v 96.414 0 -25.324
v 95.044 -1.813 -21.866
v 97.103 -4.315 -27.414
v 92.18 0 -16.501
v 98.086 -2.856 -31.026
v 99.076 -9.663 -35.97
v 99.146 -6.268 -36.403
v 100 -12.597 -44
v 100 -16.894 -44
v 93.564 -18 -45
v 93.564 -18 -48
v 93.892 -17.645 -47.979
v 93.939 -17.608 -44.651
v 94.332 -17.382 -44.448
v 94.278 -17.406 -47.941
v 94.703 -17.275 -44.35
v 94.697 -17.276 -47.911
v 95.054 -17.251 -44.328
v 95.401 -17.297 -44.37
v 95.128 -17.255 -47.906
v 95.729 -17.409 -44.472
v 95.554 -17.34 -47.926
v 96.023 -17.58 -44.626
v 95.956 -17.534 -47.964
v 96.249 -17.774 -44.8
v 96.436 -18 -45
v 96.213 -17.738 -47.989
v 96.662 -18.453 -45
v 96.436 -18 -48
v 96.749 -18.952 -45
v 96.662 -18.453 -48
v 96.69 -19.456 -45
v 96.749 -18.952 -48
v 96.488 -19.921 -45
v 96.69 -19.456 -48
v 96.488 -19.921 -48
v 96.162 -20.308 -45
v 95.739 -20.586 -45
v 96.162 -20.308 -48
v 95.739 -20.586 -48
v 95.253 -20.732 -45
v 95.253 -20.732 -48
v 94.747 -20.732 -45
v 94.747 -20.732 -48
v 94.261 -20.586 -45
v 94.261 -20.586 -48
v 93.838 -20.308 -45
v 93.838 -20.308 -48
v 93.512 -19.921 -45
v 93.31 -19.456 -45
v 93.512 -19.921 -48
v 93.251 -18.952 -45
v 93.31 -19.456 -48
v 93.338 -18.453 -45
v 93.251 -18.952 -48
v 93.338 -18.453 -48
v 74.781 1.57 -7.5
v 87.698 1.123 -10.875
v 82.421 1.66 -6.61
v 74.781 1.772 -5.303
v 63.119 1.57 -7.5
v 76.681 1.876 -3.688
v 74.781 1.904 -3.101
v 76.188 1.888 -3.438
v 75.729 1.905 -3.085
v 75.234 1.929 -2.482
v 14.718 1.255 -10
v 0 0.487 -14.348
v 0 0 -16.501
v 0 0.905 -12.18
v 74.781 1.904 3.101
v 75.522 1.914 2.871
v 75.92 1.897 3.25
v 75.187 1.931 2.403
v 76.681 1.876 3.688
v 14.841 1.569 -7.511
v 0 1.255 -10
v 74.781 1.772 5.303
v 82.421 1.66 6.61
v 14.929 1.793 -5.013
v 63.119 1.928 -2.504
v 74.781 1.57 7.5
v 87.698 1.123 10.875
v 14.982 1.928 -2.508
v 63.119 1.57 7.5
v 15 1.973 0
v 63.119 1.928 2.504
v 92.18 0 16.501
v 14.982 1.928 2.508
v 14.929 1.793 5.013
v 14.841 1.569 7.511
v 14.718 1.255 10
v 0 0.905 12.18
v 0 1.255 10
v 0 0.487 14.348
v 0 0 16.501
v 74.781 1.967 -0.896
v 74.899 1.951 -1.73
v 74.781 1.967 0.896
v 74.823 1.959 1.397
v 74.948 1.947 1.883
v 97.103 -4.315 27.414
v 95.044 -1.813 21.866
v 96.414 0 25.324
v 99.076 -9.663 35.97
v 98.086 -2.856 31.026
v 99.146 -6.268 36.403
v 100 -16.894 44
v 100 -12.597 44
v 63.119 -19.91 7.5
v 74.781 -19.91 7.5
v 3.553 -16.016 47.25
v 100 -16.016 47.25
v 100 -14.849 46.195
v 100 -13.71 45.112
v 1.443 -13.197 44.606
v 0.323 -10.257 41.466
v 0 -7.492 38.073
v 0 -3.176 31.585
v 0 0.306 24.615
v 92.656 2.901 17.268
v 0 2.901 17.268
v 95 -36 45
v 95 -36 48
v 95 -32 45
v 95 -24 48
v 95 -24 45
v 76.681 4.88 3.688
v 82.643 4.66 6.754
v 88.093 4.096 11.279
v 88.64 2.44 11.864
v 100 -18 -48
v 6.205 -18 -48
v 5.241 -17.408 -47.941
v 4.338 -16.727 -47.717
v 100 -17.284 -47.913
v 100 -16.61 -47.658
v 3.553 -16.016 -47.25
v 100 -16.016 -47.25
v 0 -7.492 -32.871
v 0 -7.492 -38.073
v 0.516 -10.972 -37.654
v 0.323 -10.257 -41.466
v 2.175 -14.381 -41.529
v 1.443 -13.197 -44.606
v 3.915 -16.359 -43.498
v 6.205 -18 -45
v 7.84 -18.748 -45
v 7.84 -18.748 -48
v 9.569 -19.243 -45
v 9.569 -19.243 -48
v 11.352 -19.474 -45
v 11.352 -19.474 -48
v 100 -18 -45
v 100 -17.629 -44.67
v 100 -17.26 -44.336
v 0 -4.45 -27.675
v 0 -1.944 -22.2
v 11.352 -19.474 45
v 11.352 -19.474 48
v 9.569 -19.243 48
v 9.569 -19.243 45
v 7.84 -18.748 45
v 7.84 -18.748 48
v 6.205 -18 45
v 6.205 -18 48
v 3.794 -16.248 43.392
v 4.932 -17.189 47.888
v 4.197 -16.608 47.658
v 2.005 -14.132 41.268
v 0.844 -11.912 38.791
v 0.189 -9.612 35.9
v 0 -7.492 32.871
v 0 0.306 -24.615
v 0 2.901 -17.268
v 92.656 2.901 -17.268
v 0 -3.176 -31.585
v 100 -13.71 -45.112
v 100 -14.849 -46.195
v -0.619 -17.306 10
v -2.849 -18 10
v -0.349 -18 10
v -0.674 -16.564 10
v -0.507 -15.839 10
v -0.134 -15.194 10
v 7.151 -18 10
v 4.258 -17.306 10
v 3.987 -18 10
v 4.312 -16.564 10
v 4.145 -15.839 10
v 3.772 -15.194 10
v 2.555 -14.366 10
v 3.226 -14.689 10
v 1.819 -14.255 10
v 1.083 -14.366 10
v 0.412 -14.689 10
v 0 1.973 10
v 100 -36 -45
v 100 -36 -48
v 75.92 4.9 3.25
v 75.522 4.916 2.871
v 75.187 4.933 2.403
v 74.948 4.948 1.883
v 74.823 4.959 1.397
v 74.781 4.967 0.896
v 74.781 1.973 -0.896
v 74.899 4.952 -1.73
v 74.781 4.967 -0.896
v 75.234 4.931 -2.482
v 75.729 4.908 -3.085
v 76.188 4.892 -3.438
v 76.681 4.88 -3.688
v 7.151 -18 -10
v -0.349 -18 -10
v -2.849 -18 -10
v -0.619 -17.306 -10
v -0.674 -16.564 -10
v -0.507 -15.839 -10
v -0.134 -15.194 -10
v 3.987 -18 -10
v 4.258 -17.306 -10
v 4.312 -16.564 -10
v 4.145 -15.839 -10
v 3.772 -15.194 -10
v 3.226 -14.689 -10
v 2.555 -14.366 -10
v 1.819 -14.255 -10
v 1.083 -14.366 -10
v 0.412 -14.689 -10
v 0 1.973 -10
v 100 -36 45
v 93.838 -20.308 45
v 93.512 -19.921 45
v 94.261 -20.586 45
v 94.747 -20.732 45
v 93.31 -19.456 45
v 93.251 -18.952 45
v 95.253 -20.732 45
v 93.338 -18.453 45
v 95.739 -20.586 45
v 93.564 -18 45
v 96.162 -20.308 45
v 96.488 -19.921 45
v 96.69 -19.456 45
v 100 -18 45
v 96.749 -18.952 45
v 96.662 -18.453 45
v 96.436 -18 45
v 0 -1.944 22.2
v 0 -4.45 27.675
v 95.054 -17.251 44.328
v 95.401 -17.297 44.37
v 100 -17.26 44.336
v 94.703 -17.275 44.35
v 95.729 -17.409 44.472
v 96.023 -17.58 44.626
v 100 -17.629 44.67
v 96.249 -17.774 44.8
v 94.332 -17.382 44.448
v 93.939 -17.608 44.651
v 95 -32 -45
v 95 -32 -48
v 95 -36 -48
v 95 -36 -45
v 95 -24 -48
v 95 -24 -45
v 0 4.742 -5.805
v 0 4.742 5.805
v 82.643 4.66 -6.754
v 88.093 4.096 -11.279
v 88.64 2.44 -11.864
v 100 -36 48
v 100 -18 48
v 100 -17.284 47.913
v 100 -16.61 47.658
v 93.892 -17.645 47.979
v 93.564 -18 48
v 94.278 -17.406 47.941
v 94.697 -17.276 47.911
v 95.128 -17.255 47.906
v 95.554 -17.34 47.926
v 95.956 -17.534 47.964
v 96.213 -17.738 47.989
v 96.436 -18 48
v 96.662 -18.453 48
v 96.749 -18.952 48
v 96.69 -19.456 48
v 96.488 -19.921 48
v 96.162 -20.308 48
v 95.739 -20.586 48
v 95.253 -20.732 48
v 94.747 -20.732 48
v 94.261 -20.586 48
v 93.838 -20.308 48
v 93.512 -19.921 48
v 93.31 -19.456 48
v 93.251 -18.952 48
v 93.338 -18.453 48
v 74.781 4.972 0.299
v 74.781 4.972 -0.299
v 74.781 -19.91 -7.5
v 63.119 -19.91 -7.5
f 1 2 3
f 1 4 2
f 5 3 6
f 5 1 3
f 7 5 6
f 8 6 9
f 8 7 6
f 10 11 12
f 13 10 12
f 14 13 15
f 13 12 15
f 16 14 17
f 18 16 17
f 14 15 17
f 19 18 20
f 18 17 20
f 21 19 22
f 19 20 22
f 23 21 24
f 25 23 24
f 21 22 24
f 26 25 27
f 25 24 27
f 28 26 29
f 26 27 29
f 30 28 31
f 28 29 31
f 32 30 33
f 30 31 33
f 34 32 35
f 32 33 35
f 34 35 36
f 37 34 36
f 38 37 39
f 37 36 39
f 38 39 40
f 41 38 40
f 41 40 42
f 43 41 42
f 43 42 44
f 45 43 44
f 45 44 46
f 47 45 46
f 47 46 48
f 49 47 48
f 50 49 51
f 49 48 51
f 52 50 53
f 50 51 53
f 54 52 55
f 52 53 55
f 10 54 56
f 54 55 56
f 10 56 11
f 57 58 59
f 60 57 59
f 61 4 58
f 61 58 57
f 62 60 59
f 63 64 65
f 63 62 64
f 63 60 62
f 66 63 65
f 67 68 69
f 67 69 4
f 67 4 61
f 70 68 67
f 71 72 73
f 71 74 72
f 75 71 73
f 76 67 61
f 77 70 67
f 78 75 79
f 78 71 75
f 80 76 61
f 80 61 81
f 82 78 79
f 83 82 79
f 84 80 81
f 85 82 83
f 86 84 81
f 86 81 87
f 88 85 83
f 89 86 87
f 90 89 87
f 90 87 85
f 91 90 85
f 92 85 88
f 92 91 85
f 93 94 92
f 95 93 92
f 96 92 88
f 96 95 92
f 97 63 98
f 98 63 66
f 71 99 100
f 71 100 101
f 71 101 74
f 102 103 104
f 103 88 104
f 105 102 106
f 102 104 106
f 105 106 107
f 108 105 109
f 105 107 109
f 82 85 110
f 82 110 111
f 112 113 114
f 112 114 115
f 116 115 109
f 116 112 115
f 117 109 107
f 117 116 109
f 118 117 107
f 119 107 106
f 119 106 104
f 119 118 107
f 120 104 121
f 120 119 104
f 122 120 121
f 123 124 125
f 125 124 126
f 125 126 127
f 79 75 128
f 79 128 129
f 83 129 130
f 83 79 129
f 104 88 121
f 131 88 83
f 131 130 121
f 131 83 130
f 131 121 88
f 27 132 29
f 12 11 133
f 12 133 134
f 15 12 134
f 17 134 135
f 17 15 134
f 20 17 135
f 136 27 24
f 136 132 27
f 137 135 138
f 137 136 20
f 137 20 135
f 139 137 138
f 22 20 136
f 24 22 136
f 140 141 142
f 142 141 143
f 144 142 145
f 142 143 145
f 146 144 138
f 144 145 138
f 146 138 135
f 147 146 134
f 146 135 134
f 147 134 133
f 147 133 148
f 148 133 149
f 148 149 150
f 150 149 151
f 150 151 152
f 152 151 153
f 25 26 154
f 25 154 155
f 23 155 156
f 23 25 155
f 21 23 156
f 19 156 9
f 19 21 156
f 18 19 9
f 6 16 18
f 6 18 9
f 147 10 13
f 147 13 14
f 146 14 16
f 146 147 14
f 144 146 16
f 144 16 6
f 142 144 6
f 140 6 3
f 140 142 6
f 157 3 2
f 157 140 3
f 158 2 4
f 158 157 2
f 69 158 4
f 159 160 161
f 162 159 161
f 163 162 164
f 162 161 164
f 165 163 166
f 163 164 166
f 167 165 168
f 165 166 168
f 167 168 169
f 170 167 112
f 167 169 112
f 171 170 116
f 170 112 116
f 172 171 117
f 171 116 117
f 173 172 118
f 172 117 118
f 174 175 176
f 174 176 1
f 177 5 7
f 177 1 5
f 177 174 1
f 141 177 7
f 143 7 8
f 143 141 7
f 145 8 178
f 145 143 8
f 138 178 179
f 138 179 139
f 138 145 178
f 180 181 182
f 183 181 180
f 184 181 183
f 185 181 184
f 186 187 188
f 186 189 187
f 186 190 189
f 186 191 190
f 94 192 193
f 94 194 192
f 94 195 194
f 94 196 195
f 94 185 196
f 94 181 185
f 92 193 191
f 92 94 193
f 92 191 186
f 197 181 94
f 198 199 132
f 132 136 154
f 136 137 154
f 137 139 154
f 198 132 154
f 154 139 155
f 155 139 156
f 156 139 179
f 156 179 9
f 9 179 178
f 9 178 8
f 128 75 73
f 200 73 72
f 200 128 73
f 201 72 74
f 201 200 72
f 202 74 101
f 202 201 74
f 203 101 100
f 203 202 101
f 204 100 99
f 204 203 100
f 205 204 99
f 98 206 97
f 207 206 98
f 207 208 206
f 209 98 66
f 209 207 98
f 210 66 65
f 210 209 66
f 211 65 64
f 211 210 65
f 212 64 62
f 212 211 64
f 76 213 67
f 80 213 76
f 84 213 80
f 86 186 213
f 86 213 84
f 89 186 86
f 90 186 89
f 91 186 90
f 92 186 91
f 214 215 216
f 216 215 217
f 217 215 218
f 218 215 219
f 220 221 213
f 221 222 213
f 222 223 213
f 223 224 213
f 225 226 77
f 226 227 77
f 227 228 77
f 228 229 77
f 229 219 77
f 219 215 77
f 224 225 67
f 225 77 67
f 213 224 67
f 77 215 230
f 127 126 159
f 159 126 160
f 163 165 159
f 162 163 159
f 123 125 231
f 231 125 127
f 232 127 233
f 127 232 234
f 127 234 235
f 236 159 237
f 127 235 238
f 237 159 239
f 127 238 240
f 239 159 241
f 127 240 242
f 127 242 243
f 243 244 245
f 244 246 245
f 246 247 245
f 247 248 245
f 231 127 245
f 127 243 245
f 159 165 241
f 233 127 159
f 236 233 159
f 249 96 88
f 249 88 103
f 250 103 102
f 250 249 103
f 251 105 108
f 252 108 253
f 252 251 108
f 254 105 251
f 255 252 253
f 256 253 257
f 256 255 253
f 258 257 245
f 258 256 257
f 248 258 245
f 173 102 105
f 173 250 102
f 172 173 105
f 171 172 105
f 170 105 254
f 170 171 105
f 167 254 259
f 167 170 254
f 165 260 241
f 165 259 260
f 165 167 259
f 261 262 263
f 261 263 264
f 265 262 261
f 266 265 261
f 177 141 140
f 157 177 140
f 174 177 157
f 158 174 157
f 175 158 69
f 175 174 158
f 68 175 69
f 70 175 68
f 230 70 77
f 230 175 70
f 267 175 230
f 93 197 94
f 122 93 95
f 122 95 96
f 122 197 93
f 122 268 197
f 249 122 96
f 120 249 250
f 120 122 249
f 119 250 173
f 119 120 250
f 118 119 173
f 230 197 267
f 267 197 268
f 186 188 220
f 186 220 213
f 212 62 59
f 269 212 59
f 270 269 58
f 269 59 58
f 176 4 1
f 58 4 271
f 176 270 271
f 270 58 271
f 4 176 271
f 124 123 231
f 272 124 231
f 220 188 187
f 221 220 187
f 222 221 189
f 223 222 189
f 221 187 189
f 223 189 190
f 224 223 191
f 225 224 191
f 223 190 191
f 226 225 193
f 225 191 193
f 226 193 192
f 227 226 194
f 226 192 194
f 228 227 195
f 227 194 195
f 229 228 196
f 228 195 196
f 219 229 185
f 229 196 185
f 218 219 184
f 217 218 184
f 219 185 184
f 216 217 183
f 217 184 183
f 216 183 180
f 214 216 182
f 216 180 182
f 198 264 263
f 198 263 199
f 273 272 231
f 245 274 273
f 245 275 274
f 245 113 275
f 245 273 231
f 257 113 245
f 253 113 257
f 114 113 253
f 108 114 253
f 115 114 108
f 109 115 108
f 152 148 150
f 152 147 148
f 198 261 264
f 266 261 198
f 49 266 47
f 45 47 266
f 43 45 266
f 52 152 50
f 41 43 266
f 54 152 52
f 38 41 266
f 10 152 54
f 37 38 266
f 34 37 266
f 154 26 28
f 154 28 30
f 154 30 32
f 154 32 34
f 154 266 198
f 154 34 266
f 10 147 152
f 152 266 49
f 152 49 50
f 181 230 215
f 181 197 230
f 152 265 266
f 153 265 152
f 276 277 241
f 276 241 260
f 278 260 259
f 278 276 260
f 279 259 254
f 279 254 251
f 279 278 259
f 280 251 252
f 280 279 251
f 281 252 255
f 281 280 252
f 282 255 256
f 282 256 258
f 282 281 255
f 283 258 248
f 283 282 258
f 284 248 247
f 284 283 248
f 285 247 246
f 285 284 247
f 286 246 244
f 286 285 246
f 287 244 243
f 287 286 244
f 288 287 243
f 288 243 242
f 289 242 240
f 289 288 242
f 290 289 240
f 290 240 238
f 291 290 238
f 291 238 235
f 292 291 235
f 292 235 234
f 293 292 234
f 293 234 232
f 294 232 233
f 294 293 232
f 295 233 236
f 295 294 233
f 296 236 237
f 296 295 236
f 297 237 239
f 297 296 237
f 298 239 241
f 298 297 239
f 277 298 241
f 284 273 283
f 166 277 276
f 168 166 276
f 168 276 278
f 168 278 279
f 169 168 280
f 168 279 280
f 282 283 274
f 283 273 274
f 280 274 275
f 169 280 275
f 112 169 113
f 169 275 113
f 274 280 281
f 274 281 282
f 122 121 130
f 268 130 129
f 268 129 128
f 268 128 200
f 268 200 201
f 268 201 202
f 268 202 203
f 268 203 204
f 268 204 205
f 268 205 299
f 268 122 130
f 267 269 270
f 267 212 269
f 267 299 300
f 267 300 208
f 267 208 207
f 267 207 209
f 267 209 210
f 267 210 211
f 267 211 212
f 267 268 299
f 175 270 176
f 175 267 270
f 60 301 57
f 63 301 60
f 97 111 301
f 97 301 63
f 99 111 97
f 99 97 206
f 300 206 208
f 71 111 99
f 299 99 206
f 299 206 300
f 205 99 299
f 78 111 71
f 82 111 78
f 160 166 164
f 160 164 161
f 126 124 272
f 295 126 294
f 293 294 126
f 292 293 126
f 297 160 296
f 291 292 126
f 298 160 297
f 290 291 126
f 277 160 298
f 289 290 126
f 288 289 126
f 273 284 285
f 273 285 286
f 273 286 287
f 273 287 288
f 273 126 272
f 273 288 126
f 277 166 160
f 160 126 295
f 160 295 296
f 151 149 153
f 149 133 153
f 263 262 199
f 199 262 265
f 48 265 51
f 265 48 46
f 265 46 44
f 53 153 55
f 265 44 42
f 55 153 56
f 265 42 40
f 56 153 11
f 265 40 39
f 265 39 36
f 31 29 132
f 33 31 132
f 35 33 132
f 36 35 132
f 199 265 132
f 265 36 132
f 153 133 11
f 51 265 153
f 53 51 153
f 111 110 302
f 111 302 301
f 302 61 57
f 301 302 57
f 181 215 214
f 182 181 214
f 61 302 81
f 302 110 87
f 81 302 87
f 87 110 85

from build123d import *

# Parameters (mm, degrees)
EXTRUDE_THIN1_DEPTH = 100
CUT_EXTRUDE2_DEPTH  = 33.5
FILLET1_R           = 3
SKETCH6_W           = 108.670856817
SKETCH6_H           = 17.879774232
CUT_EXTRUDE3_DEPTH  = 166
BOSS_EXTRUDE1_DEPTH = 10
CUT_EXTRUDE4_DEPTH  = 27
SKETCH11_R          = 1.75
CUT_EXTRUDE5_DEPTH  = 5
SKETCH12_W          = 11.662154679
SKETCH12_H          = 21.882804931
BOSS_EXTRUDE2_DEPTH = 7.5
CUT_EXTRUDE7_DEPTH  = 5
FILLET5_R           = 12
SKETCH16_W          = 5
SKETCH16_H          = 3
BOSS_EXTRUDE3_DEPTH = 4


with BuildPart() as part:
    # Sketch1 → Extrude-Thin1 (new body)
    with BuildSketch(Plane(origin=(0, 0, 0), x_dir=(0, 0, -1), z_dir=(1, 0, 0))):
        with BuildLine():
            Line((45, -32), (45, -18))
            ThreePointArc((45, -18), (32.040658091, -6.957616726), (16.501342128, 0))
            ThreePointArc((16.501342128, 0), (0, 1.972757604), (-16.501342128, 0))
            ThreePointArc((-16.501342128, 0), (-32.040658091, -6.957616726), (-45, -18))
            Line((-45, -18), (-45, -32))
            Line((-45, -32), (-48, -32))
            Line((-48, -32), (-48, -16.88185814))
            ThreePointArc((-48, -16.88185814), (-34.099982932, -4.712774746), (-17.26768466, 2.901081048))
            ThreePointArc((-17.26768466, 2.901081048), (0, 4.972757604), (17.26768466, 2.901081048))
            ThreePointArc((17.26768466, 2.901081048), (34.099982932, -4.712774746), (48, -16.88185814))
            Line((48, -16.88185814), (48, -32))
            Line((48, -32), (45, -32))
        make_face()
    extrude(amount=EXTRUDE_THIN1_DEPTH)

    # Sketch5 → Cut-Extrude2 (cut, symmetric)
    with BuildSketch(Plane(origin=(0, 0, 0), x_dir=(1, 0, 0), z_dir=(0, 1, 0))):
        with BuildLine():
            Line((74.78082212, 3), (74.78082212, -3))
            add(Edge.make_bspline(
                [(74.78082212, -3), (97.634090292, -10.562952057), (100, -44)],
                knots=[0, 0, 0, 1, 1, 1], degree=2))
            Line((100, -44), (100, 44))
            add(Edge.make_bspline(
                [(74.78082212, 3), (97.634090292, 10.562952057), (100, 44)],
                knots=[0, 0, 0, 1, 1, 1], degree=2))
        make_face()
    extrude(amount=CUT_EXTRUDE2_DEPTH, both=True, mode=Mode.SUBTRACT)

    # Fillet1
    fillet1_edges = [part.edges().sort_by_distance(p)[0] for p in [
        (50, -16.88185814, -48),
        (50, -16.88185814, 48),
        (74.78082212, 3.409765032, 3),
        (74.78082212, 3.409765032, -3),
        (46.328171757, 2.901081048, -17.26768466),
        (46.328171757, 2.901081048, 17.26768466),
    ]]
    fillet(fillet1_edges, radius=FILLET1_R)

    # Sketch6 → Cut-Extrude3 (cut)
    with BuildSketch(Plane(origin=(0, 0, -48), x_dir=(-1, 0, 0), z_dir=(0, 0, -1))):
        with Locations((-40.664571591, -32.939887116)):
            Rectangle(SKETCH6_W, SKETCH6_H)
    extrude(amount=-CUT_EXTRUDE3_DEPTH, mode=Mode.SUBTRACT)

    # Sketch8 → Boss-Extrude1 (add, symmetric)
    with BuildSketch(Plane.XY):
        Polygon((0, 1.972757604), (-2.848910504, -18), (7.151089496, -18), (15, 1.972757604), align=None)
    extrude(amount=BOSS_EXTRUDE1_DEPTH, both=True)

    # Sketch10 → Cut-Extrude4 (cut)
    with BuildSketch(Plane.XY.offset(10)):
        with BuildLine():
            Line((-0.348910504, -18), (3.987157996, -18))
            ThreePointArc((3.987157996, -18), (1.819123746, -14.255159652), (-0.348910504, -18))
        make_face()
    extrude(amount=-CUT_EXTRUDE4_DEPTH, mode=Mode.SUBTRACT)

    # Sketch11 → Cut-Extrude5 (cut)
    with BuildSketch(Plane(origin=(0, 0, -48), x_dir=(-1, 0, 0), z_dir=(0, 0, -1))):
        with Locations(Location((-95, -19, 0), (0, 0, 34.849904579))):
            Circle(SKETCH11_R)
    cut_extrude5 = extrude(amount=-CUT_EXTRUDE5_DEPTH, mode=Mode.SUBTRACT)

    # Mirror1: Cut-Extrude5 across plane
    add(cut_extrude5.mirror(Plane.XY), mode=Mode.SUBTRACT)

    # Sketch12 → Boss-Extrude2 (add, symmetric)
    with BuildSketch(Plane.XY):
        with Locations((68.949744781, -8.968644861)):
            Rectangle(SKETCH12_W, SKETCH12_H)
    extrude(amount=BOSS_EXTRUDE2_DEPTH, both=True)

    # Sketch15 → Cut-Extrude7 (cut)
    with BuildSketch(Plane(origin=(0, 0, -48), x_dir=(-1, 0, 0), z_dir=(0, 0, -1))):
        Polygon((-95, -24), (0, -18.860125055), (0, -26.57204687), align=None)
    cut_extrude7 = extrude(amount=-CUT_EXTRUDE7_DEPTH, mode=Mode.SUBTRACT)

    # Mirror2: Cut-Extrude7 across plane
    add(cut_extrude7.mirror(Plane.XY), mode=Mode.SUBTRACT)

    # Fillet5
    # the kernel refuses this fillet: 12 mm, written as the material it takes off along each edge
    with BuildSketch(Plane(origin=(0, -18.860125055, 76.420758066), x_dir=(0, 1, 0), z_dir=(0, 0, -1))) as fillet5_piece_1:
        with BuildLine():
            CenterArc((FILLET5_R * 0.947358602211, FILLET5_R), FILLET5_R, 183.096908366, 86.903091634)
            Line((-FILLET5_R * 0.0511809847104, FILLET5_R * 0.945975067318), (0, 0))
            Line((0, 0), (FILLET5_R * 0.947358602211, 0))
        make_face()
    extrude(amount=59.841516133, mode=Mode.SUBTRACT)
    with BuildSketch(Plane(origin=(0, -18.860125055, -76.420758066), x_dir=(0, 1, 0), z_dir=(0, 0, 1))) as fillet5_piece_2:
        with BuildLine():
            CenterArc((FILLET5_R * 0.947358602211, -FILLET5_R), FILLET5_R, 90, 86.903091634)
            Line((-FILLET5_R * 0.0511809847104, -FILLET5_R * 0.945975067318), (0, 0))
            Line((0, 0), (FILLET5_R * 0.947358602211, 0))
        make_face()
    extrude(amount=59.841516133, mode=Mode.SUBTRACT)

    # Sketch16 → Boss-Extrude3 (add)
    with BuildSketch(Plane.XZ.offset(32)):
        with Locations((97.5, -46.5)):
            Rectangle(SKETCH16_W, SKETCH16_H)
    boss_extrude3 = extrude(amount=BOSS_EXTRUDE3_DEPTH)

    # Mirror3: Boss-Extrude3 across plane
    add(boss_extrude3.mirror(Plane.XY))


solid = part.part
